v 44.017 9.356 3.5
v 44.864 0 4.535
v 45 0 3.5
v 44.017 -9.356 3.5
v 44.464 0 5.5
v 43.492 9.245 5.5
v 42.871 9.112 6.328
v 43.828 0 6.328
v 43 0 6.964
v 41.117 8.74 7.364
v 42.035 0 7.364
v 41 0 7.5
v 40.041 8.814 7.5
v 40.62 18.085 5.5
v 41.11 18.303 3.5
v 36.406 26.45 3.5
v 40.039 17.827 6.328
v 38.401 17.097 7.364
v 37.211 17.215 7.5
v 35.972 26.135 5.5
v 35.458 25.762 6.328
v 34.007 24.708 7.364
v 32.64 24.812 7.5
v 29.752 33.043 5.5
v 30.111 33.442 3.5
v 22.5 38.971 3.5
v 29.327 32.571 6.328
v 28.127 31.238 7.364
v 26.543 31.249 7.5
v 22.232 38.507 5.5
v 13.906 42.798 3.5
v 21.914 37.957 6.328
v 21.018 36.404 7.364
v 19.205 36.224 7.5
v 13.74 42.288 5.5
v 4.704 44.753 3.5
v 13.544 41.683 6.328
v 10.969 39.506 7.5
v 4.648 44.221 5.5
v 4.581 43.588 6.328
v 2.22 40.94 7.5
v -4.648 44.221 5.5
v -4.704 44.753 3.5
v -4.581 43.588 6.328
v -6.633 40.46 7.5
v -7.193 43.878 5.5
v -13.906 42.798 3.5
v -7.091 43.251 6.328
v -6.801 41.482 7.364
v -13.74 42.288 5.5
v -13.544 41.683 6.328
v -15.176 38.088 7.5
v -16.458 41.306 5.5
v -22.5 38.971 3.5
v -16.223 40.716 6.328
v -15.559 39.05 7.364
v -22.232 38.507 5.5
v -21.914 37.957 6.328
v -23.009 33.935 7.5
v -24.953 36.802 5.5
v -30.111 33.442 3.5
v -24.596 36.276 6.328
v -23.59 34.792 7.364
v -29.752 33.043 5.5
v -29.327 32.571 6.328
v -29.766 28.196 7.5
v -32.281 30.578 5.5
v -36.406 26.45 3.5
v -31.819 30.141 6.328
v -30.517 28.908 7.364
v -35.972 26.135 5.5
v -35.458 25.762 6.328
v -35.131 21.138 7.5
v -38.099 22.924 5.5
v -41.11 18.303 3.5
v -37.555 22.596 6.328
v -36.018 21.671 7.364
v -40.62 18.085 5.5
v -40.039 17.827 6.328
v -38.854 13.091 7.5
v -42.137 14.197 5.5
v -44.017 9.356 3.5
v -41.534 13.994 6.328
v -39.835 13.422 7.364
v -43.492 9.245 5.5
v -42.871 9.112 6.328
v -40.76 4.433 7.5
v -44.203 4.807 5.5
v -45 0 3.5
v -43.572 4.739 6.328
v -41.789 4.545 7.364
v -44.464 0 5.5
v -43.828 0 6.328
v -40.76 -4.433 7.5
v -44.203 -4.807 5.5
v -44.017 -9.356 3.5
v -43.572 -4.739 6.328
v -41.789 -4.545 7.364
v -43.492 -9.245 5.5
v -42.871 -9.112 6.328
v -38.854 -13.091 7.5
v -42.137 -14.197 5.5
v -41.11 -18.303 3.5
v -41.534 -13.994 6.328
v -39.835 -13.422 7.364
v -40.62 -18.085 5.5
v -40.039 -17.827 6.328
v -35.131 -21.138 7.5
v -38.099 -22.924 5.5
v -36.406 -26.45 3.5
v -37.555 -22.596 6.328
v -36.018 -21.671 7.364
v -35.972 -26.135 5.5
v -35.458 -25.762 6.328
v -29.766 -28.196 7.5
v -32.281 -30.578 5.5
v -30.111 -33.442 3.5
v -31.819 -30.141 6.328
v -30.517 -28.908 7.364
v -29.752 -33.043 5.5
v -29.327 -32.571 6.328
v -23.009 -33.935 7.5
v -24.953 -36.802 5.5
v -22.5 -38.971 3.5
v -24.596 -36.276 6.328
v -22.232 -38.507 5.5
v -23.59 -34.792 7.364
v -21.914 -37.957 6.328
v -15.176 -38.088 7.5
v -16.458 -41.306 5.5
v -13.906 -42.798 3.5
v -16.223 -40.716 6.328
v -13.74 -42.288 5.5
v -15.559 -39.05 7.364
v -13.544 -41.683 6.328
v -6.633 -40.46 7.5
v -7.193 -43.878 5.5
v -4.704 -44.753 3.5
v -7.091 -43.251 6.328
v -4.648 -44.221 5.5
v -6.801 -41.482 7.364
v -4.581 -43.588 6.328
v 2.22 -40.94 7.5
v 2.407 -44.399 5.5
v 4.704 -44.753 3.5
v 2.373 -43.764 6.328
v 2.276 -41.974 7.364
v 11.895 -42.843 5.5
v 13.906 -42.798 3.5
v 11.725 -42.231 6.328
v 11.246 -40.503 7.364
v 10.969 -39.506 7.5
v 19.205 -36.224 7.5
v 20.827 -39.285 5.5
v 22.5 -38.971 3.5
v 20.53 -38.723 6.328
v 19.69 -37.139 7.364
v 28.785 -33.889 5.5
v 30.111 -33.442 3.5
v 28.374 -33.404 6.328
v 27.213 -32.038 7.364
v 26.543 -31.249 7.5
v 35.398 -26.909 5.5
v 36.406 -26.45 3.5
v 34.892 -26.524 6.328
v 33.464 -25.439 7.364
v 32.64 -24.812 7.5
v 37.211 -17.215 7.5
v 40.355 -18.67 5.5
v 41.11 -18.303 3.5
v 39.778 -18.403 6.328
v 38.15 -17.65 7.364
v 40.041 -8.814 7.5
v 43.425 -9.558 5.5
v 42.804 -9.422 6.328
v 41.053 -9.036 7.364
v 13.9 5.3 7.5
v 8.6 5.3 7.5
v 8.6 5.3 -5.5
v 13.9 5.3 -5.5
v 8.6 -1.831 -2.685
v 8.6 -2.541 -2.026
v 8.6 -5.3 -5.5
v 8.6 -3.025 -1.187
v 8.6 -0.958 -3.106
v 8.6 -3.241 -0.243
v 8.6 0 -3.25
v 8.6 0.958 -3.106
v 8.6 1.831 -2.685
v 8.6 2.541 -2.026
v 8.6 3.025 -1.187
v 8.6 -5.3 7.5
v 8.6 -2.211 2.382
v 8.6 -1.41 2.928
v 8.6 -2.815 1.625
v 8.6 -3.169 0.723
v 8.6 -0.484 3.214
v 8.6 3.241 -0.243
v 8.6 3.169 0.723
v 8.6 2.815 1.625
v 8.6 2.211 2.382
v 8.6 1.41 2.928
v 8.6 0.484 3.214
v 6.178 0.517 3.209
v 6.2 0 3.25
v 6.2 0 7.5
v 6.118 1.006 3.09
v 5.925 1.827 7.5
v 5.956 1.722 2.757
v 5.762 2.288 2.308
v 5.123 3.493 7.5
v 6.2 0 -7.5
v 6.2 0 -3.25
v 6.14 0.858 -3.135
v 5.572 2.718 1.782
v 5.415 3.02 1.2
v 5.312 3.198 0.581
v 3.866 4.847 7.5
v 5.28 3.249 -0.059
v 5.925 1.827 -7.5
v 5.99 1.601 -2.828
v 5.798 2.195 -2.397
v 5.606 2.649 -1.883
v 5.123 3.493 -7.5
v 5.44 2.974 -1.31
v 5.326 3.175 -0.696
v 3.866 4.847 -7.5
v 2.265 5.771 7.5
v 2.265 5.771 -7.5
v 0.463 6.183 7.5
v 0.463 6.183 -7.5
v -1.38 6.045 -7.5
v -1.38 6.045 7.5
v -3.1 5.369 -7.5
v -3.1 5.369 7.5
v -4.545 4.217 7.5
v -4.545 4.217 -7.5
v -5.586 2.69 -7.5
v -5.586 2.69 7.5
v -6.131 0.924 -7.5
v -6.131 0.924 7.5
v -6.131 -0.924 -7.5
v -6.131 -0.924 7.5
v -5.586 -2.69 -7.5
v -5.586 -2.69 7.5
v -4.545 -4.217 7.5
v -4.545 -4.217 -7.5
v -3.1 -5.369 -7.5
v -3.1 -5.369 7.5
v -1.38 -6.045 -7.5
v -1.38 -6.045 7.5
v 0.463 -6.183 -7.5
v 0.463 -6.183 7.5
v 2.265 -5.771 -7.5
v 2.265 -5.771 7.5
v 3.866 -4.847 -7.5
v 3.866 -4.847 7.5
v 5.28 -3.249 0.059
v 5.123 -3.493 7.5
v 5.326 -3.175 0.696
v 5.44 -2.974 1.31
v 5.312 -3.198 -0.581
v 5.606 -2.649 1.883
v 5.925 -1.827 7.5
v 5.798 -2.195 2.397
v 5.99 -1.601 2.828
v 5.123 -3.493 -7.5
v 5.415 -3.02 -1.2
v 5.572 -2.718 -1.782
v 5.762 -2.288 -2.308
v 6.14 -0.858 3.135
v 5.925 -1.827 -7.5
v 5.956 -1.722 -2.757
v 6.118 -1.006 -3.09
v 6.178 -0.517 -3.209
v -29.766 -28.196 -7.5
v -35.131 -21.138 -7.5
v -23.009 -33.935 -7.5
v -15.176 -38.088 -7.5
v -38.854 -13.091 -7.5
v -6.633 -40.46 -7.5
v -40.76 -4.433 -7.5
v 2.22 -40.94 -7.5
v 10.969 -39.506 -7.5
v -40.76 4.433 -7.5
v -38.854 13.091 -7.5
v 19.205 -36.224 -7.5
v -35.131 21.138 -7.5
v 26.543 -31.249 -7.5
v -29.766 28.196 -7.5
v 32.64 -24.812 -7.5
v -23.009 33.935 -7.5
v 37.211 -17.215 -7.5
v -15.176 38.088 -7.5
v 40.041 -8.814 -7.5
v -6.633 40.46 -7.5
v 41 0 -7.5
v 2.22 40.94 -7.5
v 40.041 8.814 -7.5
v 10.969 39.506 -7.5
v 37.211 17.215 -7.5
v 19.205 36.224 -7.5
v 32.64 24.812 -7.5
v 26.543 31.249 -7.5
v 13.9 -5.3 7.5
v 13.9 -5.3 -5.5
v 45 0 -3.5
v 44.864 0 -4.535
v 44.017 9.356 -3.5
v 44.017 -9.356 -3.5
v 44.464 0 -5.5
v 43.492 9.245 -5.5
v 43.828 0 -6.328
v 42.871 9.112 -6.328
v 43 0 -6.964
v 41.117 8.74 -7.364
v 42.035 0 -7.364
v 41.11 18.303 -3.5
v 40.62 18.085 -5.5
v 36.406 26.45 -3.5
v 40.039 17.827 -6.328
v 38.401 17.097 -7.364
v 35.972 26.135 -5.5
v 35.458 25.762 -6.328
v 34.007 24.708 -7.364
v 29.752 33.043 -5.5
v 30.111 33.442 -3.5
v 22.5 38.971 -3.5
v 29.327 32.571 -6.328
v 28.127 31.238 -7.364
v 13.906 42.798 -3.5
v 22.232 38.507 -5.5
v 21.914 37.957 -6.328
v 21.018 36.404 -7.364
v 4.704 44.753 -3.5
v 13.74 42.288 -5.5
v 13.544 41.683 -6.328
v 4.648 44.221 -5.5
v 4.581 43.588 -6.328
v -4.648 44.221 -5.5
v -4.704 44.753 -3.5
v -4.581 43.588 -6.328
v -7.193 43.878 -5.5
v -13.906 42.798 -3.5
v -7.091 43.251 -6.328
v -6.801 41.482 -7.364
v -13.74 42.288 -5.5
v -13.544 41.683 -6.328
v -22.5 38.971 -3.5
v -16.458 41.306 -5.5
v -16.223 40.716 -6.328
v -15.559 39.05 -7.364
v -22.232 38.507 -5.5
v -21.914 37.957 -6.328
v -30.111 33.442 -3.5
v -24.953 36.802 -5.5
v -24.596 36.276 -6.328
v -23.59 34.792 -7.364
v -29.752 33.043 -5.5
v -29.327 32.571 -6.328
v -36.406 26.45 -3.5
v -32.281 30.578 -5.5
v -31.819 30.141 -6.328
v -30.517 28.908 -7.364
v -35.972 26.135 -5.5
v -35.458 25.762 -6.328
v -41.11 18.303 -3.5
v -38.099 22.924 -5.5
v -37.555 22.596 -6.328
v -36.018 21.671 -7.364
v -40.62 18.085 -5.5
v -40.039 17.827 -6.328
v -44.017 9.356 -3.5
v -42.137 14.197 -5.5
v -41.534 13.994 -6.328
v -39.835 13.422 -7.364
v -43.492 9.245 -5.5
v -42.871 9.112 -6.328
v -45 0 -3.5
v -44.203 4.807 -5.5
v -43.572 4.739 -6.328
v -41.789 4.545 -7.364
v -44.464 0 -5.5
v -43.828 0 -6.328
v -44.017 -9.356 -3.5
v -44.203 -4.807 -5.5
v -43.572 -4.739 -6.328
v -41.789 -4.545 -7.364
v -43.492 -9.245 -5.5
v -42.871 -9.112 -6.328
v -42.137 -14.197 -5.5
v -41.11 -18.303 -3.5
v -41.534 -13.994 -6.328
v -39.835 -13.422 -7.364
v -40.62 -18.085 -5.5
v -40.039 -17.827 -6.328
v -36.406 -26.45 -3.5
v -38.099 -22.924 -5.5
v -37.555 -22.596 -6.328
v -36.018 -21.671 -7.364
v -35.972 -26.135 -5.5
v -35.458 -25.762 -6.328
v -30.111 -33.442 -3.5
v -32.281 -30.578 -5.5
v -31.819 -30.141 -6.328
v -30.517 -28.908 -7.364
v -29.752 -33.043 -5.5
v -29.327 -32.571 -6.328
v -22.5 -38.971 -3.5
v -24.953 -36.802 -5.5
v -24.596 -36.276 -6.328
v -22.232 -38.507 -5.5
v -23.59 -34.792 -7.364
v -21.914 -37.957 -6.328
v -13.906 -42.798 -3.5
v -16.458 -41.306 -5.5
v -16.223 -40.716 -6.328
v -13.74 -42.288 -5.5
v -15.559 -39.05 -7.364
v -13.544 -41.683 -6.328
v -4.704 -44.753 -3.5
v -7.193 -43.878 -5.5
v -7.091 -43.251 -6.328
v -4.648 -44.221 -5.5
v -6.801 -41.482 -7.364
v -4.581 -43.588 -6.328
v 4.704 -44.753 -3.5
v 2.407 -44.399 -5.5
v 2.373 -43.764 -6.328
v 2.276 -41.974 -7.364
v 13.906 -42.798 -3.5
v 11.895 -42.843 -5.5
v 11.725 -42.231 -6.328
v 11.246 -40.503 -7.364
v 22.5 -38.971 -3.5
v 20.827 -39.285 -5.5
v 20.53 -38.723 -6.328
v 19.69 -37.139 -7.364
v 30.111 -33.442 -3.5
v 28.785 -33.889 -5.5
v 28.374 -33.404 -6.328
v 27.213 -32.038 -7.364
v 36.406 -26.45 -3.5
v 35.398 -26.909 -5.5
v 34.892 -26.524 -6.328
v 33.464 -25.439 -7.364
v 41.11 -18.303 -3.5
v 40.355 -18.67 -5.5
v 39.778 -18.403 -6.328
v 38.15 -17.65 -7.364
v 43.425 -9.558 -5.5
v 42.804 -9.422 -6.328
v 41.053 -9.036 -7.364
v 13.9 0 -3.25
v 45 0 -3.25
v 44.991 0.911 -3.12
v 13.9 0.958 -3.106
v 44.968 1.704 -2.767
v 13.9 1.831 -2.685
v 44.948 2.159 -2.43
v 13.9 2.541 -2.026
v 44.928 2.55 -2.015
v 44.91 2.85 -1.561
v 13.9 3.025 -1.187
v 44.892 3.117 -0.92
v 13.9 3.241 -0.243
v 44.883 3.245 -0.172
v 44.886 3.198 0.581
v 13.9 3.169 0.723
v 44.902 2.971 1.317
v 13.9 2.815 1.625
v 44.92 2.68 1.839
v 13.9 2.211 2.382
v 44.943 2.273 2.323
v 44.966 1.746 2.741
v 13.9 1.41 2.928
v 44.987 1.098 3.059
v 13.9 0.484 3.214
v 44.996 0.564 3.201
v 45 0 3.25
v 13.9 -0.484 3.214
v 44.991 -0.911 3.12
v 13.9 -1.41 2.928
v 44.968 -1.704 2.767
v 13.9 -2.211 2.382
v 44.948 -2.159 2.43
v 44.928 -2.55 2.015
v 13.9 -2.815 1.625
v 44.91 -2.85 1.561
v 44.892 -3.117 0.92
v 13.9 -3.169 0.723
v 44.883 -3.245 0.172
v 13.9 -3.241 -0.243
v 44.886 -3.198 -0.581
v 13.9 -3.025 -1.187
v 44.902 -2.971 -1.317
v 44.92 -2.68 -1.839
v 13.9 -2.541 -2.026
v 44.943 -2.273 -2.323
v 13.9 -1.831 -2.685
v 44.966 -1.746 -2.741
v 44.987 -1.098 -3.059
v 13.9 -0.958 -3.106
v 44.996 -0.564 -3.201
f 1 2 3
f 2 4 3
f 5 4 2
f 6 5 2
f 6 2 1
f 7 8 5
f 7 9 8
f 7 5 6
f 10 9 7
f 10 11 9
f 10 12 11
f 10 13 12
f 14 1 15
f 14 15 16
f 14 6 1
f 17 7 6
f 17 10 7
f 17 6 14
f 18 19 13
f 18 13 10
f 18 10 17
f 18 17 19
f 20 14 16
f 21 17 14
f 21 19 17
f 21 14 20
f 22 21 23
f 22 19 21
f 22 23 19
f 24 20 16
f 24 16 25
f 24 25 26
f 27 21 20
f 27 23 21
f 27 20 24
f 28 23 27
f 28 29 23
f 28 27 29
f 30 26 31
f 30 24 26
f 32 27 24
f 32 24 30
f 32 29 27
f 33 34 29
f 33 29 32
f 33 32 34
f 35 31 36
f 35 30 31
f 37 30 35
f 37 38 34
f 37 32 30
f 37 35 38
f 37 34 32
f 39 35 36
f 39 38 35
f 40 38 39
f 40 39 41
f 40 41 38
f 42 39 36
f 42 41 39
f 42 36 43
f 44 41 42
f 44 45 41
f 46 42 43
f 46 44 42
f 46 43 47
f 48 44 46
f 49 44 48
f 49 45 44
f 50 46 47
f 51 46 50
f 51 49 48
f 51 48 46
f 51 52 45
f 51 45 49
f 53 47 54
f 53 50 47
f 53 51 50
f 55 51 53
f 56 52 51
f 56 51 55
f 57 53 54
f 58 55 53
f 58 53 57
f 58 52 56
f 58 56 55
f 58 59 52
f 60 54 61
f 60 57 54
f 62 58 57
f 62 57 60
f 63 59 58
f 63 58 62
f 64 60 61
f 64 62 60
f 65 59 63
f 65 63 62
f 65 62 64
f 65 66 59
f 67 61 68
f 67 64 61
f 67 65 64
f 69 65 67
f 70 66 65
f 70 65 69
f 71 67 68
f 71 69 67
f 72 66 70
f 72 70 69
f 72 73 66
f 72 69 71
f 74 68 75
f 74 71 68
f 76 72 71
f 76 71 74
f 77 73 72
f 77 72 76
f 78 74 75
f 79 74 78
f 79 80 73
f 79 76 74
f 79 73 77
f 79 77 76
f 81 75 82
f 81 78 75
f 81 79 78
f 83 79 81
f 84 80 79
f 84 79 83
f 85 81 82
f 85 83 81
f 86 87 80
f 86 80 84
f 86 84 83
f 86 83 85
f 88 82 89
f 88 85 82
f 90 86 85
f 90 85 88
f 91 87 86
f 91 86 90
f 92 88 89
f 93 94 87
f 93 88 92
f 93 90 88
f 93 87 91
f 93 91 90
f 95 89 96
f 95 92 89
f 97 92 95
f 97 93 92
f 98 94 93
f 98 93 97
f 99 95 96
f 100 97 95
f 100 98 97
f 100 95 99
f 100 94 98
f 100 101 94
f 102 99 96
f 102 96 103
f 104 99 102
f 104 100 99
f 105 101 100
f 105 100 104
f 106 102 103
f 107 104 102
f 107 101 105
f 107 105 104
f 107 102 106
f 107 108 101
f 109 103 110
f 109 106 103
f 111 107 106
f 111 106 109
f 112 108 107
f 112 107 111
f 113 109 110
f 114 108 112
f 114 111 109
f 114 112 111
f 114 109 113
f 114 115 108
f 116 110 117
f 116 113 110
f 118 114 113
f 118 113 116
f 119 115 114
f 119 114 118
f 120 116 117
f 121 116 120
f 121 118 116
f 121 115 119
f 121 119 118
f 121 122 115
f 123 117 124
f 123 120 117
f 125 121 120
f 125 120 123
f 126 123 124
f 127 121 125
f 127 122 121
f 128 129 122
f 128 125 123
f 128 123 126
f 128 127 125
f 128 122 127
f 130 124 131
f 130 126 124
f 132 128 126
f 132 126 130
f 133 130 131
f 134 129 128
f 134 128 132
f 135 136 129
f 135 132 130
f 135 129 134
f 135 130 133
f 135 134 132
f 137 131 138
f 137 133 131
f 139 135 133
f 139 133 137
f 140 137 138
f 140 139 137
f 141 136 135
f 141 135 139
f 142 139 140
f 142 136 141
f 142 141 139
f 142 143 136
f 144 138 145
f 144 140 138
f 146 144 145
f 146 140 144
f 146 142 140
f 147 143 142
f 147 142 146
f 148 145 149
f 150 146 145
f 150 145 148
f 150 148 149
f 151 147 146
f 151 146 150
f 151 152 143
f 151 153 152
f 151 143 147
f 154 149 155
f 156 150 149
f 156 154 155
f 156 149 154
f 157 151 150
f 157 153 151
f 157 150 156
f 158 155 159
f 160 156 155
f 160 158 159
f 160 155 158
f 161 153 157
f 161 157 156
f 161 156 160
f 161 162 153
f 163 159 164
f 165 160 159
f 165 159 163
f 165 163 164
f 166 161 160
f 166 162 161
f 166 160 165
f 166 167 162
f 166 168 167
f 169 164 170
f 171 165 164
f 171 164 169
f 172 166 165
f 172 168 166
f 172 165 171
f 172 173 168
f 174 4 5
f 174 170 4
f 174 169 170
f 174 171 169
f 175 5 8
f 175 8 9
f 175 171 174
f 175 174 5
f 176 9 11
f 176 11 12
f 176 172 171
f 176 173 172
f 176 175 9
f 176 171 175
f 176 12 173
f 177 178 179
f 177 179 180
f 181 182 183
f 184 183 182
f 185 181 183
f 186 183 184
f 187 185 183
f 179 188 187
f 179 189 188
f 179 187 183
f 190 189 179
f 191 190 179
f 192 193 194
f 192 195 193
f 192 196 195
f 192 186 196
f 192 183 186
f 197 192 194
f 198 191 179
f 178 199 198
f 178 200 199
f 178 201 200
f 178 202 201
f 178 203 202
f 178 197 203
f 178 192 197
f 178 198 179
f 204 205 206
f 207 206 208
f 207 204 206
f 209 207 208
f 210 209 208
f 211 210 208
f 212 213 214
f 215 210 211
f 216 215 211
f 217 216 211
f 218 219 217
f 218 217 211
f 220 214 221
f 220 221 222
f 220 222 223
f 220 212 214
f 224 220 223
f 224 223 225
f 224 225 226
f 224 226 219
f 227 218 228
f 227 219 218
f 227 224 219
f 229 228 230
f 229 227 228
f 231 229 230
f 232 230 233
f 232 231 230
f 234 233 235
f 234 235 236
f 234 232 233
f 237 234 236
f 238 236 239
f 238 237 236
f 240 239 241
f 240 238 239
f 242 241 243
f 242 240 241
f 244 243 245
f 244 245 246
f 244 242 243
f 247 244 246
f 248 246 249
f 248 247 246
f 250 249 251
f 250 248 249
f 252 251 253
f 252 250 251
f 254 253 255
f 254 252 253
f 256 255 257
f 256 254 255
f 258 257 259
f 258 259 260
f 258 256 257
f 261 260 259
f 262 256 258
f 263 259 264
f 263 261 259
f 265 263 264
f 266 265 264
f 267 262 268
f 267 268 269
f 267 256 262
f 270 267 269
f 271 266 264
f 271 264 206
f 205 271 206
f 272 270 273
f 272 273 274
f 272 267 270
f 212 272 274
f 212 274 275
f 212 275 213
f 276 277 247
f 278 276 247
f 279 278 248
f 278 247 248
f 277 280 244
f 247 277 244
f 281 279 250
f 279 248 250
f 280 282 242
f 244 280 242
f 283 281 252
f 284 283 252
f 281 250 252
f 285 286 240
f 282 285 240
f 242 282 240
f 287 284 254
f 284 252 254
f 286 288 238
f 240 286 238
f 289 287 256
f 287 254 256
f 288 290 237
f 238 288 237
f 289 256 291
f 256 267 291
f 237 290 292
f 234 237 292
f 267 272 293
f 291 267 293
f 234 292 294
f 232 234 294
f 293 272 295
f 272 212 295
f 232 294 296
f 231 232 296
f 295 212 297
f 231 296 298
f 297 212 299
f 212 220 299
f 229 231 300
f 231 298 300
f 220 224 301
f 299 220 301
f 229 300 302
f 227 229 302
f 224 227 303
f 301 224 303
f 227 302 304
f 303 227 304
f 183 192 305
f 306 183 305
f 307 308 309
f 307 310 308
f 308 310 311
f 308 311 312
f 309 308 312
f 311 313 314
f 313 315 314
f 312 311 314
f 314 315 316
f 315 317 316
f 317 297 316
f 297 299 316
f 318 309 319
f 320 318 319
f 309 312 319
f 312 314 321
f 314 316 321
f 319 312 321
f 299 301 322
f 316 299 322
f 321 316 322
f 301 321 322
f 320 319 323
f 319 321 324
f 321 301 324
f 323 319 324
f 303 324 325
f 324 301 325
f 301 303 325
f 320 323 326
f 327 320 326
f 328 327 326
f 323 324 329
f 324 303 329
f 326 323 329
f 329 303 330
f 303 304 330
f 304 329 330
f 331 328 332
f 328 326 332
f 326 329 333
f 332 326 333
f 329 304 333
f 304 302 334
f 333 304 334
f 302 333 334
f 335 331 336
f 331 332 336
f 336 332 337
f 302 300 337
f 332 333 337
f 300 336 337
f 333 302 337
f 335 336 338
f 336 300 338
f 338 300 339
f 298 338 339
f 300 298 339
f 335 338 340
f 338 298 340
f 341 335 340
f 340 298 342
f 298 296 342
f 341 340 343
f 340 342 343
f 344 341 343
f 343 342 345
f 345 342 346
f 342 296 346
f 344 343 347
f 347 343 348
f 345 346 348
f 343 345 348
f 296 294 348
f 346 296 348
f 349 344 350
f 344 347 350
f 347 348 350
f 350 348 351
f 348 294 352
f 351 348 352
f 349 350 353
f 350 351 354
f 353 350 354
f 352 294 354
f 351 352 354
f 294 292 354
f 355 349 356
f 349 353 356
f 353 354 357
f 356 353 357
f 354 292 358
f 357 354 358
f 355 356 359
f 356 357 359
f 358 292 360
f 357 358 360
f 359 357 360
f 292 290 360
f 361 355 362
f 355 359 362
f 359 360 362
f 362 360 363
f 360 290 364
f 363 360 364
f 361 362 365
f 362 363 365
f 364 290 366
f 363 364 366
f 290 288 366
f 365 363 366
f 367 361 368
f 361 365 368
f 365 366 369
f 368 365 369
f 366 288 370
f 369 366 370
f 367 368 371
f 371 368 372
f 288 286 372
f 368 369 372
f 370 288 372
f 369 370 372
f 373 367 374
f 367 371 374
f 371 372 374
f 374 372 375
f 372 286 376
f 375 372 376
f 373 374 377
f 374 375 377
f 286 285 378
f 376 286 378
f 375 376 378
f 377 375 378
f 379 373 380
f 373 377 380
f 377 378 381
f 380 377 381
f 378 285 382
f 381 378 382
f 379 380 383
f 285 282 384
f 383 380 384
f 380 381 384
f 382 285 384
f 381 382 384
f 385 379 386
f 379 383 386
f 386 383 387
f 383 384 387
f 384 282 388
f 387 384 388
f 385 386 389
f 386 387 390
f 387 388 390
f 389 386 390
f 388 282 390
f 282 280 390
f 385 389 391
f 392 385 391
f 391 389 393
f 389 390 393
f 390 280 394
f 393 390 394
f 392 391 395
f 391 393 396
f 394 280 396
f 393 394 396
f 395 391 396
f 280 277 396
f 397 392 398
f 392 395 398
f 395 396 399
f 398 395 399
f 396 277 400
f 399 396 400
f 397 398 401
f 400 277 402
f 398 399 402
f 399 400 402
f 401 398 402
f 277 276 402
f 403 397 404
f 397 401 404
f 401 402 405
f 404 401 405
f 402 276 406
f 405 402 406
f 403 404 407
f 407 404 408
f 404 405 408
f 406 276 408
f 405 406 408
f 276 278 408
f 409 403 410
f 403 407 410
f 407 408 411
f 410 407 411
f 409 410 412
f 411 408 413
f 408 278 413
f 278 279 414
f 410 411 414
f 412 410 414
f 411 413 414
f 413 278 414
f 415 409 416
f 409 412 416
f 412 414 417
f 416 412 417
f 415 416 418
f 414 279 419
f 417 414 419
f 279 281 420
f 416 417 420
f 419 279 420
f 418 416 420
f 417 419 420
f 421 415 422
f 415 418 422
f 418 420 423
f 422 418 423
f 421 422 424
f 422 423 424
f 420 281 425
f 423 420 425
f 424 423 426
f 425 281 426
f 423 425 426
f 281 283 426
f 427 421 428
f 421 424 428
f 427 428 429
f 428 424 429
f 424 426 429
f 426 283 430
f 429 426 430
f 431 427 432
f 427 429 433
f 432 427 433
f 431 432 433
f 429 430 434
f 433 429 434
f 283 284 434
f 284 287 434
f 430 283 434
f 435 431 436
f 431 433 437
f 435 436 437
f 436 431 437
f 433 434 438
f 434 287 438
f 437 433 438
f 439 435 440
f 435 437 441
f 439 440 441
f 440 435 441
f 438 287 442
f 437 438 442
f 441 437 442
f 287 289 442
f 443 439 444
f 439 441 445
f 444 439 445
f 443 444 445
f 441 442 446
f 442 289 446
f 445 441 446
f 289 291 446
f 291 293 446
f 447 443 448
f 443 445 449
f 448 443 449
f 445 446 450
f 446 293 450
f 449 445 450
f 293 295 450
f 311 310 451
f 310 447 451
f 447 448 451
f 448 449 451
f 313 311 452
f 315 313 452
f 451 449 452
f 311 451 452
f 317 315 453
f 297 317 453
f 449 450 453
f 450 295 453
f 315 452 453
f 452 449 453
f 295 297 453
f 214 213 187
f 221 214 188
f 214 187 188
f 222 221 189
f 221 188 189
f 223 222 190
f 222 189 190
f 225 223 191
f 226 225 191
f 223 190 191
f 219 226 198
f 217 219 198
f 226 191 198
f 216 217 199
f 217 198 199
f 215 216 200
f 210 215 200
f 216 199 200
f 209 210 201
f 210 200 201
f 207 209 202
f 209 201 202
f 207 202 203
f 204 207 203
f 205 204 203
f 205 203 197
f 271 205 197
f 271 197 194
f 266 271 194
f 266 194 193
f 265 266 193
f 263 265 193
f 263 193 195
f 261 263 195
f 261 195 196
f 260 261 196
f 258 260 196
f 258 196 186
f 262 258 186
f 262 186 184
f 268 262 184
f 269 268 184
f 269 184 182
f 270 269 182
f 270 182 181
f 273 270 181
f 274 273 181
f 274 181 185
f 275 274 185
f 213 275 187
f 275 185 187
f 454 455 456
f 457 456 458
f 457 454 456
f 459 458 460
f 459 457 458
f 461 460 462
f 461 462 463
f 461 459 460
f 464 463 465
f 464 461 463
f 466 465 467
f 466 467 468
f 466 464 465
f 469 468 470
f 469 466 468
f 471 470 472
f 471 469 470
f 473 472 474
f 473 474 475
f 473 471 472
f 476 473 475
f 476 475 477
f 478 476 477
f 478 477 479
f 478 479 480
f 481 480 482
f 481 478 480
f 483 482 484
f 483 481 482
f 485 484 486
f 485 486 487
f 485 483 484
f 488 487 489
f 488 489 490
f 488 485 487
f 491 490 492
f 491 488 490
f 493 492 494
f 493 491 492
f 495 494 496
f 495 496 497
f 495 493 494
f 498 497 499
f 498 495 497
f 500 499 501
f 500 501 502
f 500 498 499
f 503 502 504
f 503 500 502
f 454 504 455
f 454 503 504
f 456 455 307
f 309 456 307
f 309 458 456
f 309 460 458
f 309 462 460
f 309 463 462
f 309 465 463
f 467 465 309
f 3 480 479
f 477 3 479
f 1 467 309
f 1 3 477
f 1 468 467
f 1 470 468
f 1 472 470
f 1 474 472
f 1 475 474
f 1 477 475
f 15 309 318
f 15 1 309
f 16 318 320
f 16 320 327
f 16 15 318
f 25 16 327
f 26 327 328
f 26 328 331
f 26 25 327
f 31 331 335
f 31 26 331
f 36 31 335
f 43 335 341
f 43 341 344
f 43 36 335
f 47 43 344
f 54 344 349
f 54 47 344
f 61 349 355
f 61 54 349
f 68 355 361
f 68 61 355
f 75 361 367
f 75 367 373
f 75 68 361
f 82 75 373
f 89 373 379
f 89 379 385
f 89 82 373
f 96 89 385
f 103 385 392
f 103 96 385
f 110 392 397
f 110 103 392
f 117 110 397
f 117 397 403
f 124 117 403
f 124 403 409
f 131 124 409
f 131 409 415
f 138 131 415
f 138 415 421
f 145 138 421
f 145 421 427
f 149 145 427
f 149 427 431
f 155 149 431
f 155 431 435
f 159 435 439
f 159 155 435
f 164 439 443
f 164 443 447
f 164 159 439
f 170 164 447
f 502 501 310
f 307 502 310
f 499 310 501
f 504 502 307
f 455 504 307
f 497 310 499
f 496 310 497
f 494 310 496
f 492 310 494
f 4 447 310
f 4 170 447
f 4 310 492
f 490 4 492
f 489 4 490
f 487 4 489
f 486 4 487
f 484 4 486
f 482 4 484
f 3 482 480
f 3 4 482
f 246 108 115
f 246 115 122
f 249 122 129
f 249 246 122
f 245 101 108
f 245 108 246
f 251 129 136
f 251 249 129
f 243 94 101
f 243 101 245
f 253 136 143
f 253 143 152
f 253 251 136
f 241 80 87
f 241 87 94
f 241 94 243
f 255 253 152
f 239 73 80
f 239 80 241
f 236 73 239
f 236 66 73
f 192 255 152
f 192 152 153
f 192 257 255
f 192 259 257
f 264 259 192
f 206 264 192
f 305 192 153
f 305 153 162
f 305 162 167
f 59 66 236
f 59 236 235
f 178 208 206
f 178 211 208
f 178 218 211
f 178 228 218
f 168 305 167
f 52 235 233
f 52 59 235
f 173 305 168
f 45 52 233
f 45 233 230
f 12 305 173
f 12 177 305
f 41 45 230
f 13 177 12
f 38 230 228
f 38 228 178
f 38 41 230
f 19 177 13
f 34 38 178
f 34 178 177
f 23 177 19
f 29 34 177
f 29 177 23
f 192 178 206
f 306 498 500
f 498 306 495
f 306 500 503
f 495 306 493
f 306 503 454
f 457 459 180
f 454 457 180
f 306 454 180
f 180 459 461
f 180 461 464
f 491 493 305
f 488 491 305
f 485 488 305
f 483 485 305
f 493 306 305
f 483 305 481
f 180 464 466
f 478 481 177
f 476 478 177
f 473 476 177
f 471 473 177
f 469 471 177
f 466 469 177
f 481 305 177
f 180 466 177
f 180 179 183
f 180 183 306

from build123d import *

# Parameters (mm, degrees)
SKETCH1_R               = 45
SKETCH1_R_2             = 6.2
BOSS_EXTRUDE1_DEPTH     = 7.5
SKETCH2_W               = 5.3
SKETCH2_H               = 10.6
CUT_EXTRUDE1_DEPTH      = 13
SKETCH3_R               = 3.25
CUT_EXTRUDE2_DEPTH      = 37.4
CUT_EXTRUDE2_DEPTH_BACK = 13
FILLET1_R               = 4


with BuildPart() as part:
    # Sketch1 → Boss-Extrude1 (new body, symmetric)
    with BuildSketch(Plane.XY):
        Circle(SKETCH1_R)
        Circle(SKETCH1_R_2, mode=Mode.SUBTRACT)
    extrude(amount=BOSS_EXTRUDE1_DEPTH, both=True)

    # Sketch2 → Cut-Extrude1 (cut)
    with BuildSketch(Plane.XY.offset(7.5)):
        with Locations((11.25, 0)):
            Rectangle(SKETCH2_W, SKETCH2_H)
    extrude(amount=-CUT_EXTRUDE1_DEPTH, mode=Mode.SUBTRACT)

    # Sketch3 → Cut-Extrude2 (cut, two sides)
    with BuildSketch(Plane(origin=(8.6, 0, 0), x_dir=(0, 0, -1), z_dir=(1, 0, 0))) as cut_extrude2_sk:
        Circle(SKETCH3_R)
    extrude(amount=CUT_EXTRUDE2_DEPTH, mode=Mode.SUBTRACT)
    extrude(cut_extrude2_sk.sketch, amount=-CUT_EXTRUDE2_DEPTH_BACK, mode=Mode.SUBTRACT)

    # Fillet1
    fillet1_edges = [part.edges().sort_by_distance(p)[0] for p in [
        (-45, 0, -7.5),
        (-45, 0, 7.5),
    ]]
    fillet(fillet1_edges, radius=FILLET1_R)


solid = part.part
